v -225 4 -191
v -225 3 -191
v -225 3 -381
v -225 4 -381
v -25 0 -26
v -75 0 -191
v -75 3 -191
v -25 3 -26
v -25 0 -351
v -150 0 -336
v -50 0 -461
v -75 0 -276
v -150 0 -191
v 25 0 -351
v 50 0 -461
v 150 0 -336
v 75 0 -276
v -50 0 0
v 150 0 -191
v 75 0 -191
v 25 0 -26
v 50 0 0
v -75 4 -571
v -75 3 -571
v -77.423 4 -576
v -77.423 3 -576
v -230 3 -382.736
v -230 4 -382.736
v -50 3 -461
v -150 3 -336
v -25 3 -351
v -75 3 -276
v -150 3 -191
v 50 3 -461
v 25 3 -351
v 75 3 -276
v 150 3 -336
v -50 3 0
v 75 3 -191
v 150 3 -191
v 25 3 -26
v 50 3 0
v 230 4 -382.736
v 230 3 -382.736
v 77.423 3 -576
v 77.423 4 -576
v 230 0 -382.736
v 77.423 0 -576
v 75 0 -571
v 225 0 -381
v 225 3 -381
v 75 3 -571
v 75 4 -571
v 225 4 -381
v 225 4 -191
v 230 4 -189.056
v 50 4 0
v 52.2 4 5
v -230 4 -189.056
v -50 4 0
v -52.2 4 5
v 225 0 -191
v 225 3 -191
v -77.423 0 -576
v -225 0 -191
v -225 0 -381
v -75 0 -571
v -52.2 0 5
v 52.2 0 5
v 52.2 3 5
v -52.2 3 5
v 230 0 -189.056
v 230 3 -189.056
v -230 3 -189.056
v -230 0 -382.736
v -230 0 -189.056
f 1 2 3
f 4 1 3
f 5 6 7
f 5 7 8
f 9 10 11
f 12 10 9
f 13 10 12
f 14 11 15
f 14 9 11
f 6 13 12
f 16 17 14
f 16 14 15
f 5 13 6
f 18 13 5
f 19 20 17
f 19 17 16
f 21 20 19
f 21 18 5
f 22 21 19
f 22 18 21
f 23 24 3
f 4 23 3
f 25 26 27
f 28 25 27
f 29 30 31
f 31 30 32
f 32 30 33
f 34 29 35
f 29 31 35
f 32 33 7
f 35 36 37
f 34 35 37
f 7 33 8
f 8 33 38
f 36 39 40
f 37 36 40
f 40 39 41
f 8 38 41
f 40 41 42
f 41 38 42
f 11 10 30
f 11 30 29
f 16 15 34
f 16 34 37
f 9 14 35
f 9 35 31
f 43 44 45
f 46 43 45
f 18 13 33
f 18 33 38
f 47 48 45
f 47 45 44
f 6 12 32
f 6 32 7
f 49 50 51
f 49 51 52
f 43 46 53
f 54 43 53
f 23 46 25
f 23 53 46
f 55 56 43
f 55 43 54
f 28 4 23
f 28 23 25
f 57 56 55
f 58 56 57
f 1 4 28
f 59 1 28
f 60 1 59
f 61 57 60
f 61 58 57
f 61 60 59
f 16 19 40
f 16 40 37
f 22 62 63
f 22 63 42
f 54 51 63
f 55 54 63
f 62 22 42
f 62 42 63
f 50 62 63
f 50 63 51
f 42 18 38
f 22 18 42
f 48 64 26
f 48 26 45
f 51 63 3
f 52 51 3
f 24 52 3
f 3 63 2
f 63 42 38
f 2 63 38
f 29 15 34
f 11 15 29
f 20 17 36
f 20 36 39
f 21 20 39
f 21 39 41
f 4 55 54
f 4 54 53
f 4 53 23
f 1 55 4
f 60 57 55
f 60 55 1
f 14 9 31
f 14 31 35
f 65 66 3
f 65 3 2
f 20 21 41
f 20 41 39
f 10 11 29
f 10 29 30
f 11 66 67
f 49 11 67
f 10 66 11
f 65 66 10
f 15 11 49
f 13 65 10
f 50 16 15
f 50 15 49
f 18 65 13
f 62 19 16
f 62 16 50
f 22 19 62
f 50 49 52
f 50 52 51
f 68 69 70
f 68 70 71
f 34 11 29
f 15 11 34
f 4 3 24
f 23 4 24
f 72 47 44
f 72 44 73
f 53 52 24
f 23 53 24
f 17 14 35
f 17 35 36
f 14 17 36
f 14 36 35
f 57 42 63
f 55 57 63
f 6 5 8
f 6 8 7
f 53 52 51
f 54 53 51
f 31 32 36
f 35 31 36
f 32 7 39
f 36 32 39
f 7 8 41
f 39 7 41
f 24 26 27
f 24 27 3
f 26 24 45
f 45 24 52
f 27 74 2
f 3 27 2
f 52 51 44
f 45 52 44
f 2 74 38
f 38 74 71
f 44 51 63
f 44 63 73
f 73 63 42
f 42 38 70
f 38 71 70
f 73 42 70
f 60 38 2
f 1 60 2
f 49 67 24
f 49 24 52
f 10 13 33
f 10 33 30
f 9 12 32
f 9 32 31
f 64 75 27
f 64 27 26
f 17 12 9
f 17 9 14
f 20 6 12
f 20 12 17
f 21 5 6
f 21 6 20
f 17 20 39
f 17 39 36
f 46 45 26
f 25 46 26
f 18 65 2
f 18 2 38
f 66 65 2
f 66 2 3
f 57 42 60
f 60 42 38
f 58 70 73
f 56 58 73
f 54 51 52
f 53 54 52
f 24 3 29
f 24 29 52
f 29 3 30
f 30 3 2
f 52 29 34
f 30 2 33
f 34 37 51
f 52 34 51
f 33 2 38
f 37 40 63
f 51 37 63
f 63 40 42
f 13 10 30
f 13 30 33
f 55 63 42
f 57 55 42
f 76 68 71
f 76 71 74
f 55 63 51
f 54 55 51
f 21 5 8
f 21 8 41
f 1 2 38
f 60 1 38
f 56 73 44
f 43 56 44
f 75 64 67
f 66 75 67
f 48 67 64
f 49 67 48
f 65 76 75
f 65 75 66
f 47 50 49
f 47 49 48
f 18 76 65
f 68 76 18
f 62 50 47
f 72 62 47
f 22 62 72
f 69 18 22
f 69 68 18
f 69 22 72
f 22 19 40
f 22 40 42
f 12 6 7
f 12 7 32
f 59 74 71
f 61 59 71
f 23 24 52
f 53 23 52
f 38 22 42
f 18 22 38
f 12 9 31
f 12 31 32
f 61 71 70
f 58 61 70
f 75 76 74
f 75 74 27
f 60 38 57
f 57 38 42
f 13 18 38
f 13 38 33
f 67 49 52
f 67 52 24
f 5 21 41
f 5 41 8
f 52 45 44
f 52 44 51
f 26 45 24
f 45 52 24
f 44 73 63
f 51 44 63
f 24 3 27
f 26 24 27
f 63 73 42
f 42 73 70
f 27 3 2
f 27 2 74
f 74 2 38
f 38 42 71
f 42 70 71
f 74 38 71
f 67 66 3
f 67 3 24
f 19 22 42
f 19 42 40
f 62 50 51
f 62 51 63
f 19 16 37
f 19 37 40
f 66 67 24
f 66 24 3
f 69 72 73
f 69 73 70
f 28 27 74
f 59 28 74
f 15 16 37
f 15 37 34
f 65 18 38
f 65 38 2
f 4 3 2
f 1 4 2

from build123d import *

# Parameters (mm, degrees)
F1_DEPTH  = 3
F3_DEPTH  = 3
F5_DEPTH  = 3
F7_DEPTH  = 3
F9_DEPTH  = 1
F11_DEPTH = 1


with BuildPart() as f1:
    # F0 (on Front) → F1 (new body)
    with BuildSketch(Plane.XZ):
        Polygon((25, -26), (-25, -26), (-75, -191), (-75, -276), (-25, -351), (25, -351), (75, -276), (75, -191), align=None)
    extrude(amount=-F1_DEPTH)


with BuildPart() as f3:
    # F2 (on Front) → F3 (new body)
    with BuildSketch(Plane.XZ):
        Polygon((50, 0), (0, 0), (-50, 0), (-150, -191), (-150, -336), (-50, -461), (50, -461), (150, -336), (150, -191), align=None)
        Polygon((-75, -276), (-75, -191), (-25, -26), (25, -26), (75, -191), (75, -276), (25, -351), (-25, -351), align=None, mode=Mode.SUBTRACT)
    extrude(amount=-F3_DEPTH)


with BuildPart() as f5:
    # F4 (on face) → F5 (new body)
    with BuildSketch(Plane.XZ):
        Polygon((-150, -191), (-50, 0), (-225, -191), (-225, -381), (-75, -571), (75, -571), (225, -381), (225, -191), (50, 0), (150, -191), (150, -336), (50, -461), (-50, -461), (-150, -336), align=None)
    extrude(amount=-F5_DEPTH)


with BuildPart() as f7:
    # F6 (on face) → F7 (new body)
    with BuildSketch(Plane.XZ):
        Polygon((52.200216, 5), (-52.200216, 5), (-230, -189.055764), (-230, -382.735812), (-77.42301, -576), (77.42301, -576), (230, -382.735812), (230, -189.055764), align=None)
        Polygon((-225, -191), (-50, 0), (50, 0), (225, -191), (225, -381), (75, -571), (-75, -571), (-225, -381), align=None, mode=Mode.SUBTRACT)
    extrude(amount=-F7_DEPTH)


with BuildPart() as f9:
    # F8 (on face) → F9 (new body)
    with BuildSketch(Plane(origin=(0, 3, 0), x_dir=(-1, 0, 0), z_dir=(0, 1, 0))):
        Polygon((225, -381), (225, -191), (50, 0), (-50, 0), (-225, -191), (-225, -381), (-75, -571), (75, -571), align=None)
    extrude(amount=F9_DEPTH)


with BuildPart() as f11:
    # F10 (on face) → F11 (new body)
    with BuildSketch(Plane(origin=(0, 3, 0), x_dir=(-1, 0, 0), z_dir=(0, 1, 0))):
        Polygon((230, -189.055764), (52.200216, 5), (-52.200216, 5), (-230, -189.055764), (-230, -382.735812), (-77.42301, -576), (77.42301, -576), (230, -382.735812), align=None)
        Polygon((-50, 0), (50, 0), (225, -191), (225, -381), (75, -571), (-75, -571), (-225, -381), (-225, -191), align=None, mode=Mode.SUBTRACT)
    extrude(amount=F11_DEPTH)


solid = Compound([f1.part, f3.part, f5.part, f7.part, f9.part, f11.part])
